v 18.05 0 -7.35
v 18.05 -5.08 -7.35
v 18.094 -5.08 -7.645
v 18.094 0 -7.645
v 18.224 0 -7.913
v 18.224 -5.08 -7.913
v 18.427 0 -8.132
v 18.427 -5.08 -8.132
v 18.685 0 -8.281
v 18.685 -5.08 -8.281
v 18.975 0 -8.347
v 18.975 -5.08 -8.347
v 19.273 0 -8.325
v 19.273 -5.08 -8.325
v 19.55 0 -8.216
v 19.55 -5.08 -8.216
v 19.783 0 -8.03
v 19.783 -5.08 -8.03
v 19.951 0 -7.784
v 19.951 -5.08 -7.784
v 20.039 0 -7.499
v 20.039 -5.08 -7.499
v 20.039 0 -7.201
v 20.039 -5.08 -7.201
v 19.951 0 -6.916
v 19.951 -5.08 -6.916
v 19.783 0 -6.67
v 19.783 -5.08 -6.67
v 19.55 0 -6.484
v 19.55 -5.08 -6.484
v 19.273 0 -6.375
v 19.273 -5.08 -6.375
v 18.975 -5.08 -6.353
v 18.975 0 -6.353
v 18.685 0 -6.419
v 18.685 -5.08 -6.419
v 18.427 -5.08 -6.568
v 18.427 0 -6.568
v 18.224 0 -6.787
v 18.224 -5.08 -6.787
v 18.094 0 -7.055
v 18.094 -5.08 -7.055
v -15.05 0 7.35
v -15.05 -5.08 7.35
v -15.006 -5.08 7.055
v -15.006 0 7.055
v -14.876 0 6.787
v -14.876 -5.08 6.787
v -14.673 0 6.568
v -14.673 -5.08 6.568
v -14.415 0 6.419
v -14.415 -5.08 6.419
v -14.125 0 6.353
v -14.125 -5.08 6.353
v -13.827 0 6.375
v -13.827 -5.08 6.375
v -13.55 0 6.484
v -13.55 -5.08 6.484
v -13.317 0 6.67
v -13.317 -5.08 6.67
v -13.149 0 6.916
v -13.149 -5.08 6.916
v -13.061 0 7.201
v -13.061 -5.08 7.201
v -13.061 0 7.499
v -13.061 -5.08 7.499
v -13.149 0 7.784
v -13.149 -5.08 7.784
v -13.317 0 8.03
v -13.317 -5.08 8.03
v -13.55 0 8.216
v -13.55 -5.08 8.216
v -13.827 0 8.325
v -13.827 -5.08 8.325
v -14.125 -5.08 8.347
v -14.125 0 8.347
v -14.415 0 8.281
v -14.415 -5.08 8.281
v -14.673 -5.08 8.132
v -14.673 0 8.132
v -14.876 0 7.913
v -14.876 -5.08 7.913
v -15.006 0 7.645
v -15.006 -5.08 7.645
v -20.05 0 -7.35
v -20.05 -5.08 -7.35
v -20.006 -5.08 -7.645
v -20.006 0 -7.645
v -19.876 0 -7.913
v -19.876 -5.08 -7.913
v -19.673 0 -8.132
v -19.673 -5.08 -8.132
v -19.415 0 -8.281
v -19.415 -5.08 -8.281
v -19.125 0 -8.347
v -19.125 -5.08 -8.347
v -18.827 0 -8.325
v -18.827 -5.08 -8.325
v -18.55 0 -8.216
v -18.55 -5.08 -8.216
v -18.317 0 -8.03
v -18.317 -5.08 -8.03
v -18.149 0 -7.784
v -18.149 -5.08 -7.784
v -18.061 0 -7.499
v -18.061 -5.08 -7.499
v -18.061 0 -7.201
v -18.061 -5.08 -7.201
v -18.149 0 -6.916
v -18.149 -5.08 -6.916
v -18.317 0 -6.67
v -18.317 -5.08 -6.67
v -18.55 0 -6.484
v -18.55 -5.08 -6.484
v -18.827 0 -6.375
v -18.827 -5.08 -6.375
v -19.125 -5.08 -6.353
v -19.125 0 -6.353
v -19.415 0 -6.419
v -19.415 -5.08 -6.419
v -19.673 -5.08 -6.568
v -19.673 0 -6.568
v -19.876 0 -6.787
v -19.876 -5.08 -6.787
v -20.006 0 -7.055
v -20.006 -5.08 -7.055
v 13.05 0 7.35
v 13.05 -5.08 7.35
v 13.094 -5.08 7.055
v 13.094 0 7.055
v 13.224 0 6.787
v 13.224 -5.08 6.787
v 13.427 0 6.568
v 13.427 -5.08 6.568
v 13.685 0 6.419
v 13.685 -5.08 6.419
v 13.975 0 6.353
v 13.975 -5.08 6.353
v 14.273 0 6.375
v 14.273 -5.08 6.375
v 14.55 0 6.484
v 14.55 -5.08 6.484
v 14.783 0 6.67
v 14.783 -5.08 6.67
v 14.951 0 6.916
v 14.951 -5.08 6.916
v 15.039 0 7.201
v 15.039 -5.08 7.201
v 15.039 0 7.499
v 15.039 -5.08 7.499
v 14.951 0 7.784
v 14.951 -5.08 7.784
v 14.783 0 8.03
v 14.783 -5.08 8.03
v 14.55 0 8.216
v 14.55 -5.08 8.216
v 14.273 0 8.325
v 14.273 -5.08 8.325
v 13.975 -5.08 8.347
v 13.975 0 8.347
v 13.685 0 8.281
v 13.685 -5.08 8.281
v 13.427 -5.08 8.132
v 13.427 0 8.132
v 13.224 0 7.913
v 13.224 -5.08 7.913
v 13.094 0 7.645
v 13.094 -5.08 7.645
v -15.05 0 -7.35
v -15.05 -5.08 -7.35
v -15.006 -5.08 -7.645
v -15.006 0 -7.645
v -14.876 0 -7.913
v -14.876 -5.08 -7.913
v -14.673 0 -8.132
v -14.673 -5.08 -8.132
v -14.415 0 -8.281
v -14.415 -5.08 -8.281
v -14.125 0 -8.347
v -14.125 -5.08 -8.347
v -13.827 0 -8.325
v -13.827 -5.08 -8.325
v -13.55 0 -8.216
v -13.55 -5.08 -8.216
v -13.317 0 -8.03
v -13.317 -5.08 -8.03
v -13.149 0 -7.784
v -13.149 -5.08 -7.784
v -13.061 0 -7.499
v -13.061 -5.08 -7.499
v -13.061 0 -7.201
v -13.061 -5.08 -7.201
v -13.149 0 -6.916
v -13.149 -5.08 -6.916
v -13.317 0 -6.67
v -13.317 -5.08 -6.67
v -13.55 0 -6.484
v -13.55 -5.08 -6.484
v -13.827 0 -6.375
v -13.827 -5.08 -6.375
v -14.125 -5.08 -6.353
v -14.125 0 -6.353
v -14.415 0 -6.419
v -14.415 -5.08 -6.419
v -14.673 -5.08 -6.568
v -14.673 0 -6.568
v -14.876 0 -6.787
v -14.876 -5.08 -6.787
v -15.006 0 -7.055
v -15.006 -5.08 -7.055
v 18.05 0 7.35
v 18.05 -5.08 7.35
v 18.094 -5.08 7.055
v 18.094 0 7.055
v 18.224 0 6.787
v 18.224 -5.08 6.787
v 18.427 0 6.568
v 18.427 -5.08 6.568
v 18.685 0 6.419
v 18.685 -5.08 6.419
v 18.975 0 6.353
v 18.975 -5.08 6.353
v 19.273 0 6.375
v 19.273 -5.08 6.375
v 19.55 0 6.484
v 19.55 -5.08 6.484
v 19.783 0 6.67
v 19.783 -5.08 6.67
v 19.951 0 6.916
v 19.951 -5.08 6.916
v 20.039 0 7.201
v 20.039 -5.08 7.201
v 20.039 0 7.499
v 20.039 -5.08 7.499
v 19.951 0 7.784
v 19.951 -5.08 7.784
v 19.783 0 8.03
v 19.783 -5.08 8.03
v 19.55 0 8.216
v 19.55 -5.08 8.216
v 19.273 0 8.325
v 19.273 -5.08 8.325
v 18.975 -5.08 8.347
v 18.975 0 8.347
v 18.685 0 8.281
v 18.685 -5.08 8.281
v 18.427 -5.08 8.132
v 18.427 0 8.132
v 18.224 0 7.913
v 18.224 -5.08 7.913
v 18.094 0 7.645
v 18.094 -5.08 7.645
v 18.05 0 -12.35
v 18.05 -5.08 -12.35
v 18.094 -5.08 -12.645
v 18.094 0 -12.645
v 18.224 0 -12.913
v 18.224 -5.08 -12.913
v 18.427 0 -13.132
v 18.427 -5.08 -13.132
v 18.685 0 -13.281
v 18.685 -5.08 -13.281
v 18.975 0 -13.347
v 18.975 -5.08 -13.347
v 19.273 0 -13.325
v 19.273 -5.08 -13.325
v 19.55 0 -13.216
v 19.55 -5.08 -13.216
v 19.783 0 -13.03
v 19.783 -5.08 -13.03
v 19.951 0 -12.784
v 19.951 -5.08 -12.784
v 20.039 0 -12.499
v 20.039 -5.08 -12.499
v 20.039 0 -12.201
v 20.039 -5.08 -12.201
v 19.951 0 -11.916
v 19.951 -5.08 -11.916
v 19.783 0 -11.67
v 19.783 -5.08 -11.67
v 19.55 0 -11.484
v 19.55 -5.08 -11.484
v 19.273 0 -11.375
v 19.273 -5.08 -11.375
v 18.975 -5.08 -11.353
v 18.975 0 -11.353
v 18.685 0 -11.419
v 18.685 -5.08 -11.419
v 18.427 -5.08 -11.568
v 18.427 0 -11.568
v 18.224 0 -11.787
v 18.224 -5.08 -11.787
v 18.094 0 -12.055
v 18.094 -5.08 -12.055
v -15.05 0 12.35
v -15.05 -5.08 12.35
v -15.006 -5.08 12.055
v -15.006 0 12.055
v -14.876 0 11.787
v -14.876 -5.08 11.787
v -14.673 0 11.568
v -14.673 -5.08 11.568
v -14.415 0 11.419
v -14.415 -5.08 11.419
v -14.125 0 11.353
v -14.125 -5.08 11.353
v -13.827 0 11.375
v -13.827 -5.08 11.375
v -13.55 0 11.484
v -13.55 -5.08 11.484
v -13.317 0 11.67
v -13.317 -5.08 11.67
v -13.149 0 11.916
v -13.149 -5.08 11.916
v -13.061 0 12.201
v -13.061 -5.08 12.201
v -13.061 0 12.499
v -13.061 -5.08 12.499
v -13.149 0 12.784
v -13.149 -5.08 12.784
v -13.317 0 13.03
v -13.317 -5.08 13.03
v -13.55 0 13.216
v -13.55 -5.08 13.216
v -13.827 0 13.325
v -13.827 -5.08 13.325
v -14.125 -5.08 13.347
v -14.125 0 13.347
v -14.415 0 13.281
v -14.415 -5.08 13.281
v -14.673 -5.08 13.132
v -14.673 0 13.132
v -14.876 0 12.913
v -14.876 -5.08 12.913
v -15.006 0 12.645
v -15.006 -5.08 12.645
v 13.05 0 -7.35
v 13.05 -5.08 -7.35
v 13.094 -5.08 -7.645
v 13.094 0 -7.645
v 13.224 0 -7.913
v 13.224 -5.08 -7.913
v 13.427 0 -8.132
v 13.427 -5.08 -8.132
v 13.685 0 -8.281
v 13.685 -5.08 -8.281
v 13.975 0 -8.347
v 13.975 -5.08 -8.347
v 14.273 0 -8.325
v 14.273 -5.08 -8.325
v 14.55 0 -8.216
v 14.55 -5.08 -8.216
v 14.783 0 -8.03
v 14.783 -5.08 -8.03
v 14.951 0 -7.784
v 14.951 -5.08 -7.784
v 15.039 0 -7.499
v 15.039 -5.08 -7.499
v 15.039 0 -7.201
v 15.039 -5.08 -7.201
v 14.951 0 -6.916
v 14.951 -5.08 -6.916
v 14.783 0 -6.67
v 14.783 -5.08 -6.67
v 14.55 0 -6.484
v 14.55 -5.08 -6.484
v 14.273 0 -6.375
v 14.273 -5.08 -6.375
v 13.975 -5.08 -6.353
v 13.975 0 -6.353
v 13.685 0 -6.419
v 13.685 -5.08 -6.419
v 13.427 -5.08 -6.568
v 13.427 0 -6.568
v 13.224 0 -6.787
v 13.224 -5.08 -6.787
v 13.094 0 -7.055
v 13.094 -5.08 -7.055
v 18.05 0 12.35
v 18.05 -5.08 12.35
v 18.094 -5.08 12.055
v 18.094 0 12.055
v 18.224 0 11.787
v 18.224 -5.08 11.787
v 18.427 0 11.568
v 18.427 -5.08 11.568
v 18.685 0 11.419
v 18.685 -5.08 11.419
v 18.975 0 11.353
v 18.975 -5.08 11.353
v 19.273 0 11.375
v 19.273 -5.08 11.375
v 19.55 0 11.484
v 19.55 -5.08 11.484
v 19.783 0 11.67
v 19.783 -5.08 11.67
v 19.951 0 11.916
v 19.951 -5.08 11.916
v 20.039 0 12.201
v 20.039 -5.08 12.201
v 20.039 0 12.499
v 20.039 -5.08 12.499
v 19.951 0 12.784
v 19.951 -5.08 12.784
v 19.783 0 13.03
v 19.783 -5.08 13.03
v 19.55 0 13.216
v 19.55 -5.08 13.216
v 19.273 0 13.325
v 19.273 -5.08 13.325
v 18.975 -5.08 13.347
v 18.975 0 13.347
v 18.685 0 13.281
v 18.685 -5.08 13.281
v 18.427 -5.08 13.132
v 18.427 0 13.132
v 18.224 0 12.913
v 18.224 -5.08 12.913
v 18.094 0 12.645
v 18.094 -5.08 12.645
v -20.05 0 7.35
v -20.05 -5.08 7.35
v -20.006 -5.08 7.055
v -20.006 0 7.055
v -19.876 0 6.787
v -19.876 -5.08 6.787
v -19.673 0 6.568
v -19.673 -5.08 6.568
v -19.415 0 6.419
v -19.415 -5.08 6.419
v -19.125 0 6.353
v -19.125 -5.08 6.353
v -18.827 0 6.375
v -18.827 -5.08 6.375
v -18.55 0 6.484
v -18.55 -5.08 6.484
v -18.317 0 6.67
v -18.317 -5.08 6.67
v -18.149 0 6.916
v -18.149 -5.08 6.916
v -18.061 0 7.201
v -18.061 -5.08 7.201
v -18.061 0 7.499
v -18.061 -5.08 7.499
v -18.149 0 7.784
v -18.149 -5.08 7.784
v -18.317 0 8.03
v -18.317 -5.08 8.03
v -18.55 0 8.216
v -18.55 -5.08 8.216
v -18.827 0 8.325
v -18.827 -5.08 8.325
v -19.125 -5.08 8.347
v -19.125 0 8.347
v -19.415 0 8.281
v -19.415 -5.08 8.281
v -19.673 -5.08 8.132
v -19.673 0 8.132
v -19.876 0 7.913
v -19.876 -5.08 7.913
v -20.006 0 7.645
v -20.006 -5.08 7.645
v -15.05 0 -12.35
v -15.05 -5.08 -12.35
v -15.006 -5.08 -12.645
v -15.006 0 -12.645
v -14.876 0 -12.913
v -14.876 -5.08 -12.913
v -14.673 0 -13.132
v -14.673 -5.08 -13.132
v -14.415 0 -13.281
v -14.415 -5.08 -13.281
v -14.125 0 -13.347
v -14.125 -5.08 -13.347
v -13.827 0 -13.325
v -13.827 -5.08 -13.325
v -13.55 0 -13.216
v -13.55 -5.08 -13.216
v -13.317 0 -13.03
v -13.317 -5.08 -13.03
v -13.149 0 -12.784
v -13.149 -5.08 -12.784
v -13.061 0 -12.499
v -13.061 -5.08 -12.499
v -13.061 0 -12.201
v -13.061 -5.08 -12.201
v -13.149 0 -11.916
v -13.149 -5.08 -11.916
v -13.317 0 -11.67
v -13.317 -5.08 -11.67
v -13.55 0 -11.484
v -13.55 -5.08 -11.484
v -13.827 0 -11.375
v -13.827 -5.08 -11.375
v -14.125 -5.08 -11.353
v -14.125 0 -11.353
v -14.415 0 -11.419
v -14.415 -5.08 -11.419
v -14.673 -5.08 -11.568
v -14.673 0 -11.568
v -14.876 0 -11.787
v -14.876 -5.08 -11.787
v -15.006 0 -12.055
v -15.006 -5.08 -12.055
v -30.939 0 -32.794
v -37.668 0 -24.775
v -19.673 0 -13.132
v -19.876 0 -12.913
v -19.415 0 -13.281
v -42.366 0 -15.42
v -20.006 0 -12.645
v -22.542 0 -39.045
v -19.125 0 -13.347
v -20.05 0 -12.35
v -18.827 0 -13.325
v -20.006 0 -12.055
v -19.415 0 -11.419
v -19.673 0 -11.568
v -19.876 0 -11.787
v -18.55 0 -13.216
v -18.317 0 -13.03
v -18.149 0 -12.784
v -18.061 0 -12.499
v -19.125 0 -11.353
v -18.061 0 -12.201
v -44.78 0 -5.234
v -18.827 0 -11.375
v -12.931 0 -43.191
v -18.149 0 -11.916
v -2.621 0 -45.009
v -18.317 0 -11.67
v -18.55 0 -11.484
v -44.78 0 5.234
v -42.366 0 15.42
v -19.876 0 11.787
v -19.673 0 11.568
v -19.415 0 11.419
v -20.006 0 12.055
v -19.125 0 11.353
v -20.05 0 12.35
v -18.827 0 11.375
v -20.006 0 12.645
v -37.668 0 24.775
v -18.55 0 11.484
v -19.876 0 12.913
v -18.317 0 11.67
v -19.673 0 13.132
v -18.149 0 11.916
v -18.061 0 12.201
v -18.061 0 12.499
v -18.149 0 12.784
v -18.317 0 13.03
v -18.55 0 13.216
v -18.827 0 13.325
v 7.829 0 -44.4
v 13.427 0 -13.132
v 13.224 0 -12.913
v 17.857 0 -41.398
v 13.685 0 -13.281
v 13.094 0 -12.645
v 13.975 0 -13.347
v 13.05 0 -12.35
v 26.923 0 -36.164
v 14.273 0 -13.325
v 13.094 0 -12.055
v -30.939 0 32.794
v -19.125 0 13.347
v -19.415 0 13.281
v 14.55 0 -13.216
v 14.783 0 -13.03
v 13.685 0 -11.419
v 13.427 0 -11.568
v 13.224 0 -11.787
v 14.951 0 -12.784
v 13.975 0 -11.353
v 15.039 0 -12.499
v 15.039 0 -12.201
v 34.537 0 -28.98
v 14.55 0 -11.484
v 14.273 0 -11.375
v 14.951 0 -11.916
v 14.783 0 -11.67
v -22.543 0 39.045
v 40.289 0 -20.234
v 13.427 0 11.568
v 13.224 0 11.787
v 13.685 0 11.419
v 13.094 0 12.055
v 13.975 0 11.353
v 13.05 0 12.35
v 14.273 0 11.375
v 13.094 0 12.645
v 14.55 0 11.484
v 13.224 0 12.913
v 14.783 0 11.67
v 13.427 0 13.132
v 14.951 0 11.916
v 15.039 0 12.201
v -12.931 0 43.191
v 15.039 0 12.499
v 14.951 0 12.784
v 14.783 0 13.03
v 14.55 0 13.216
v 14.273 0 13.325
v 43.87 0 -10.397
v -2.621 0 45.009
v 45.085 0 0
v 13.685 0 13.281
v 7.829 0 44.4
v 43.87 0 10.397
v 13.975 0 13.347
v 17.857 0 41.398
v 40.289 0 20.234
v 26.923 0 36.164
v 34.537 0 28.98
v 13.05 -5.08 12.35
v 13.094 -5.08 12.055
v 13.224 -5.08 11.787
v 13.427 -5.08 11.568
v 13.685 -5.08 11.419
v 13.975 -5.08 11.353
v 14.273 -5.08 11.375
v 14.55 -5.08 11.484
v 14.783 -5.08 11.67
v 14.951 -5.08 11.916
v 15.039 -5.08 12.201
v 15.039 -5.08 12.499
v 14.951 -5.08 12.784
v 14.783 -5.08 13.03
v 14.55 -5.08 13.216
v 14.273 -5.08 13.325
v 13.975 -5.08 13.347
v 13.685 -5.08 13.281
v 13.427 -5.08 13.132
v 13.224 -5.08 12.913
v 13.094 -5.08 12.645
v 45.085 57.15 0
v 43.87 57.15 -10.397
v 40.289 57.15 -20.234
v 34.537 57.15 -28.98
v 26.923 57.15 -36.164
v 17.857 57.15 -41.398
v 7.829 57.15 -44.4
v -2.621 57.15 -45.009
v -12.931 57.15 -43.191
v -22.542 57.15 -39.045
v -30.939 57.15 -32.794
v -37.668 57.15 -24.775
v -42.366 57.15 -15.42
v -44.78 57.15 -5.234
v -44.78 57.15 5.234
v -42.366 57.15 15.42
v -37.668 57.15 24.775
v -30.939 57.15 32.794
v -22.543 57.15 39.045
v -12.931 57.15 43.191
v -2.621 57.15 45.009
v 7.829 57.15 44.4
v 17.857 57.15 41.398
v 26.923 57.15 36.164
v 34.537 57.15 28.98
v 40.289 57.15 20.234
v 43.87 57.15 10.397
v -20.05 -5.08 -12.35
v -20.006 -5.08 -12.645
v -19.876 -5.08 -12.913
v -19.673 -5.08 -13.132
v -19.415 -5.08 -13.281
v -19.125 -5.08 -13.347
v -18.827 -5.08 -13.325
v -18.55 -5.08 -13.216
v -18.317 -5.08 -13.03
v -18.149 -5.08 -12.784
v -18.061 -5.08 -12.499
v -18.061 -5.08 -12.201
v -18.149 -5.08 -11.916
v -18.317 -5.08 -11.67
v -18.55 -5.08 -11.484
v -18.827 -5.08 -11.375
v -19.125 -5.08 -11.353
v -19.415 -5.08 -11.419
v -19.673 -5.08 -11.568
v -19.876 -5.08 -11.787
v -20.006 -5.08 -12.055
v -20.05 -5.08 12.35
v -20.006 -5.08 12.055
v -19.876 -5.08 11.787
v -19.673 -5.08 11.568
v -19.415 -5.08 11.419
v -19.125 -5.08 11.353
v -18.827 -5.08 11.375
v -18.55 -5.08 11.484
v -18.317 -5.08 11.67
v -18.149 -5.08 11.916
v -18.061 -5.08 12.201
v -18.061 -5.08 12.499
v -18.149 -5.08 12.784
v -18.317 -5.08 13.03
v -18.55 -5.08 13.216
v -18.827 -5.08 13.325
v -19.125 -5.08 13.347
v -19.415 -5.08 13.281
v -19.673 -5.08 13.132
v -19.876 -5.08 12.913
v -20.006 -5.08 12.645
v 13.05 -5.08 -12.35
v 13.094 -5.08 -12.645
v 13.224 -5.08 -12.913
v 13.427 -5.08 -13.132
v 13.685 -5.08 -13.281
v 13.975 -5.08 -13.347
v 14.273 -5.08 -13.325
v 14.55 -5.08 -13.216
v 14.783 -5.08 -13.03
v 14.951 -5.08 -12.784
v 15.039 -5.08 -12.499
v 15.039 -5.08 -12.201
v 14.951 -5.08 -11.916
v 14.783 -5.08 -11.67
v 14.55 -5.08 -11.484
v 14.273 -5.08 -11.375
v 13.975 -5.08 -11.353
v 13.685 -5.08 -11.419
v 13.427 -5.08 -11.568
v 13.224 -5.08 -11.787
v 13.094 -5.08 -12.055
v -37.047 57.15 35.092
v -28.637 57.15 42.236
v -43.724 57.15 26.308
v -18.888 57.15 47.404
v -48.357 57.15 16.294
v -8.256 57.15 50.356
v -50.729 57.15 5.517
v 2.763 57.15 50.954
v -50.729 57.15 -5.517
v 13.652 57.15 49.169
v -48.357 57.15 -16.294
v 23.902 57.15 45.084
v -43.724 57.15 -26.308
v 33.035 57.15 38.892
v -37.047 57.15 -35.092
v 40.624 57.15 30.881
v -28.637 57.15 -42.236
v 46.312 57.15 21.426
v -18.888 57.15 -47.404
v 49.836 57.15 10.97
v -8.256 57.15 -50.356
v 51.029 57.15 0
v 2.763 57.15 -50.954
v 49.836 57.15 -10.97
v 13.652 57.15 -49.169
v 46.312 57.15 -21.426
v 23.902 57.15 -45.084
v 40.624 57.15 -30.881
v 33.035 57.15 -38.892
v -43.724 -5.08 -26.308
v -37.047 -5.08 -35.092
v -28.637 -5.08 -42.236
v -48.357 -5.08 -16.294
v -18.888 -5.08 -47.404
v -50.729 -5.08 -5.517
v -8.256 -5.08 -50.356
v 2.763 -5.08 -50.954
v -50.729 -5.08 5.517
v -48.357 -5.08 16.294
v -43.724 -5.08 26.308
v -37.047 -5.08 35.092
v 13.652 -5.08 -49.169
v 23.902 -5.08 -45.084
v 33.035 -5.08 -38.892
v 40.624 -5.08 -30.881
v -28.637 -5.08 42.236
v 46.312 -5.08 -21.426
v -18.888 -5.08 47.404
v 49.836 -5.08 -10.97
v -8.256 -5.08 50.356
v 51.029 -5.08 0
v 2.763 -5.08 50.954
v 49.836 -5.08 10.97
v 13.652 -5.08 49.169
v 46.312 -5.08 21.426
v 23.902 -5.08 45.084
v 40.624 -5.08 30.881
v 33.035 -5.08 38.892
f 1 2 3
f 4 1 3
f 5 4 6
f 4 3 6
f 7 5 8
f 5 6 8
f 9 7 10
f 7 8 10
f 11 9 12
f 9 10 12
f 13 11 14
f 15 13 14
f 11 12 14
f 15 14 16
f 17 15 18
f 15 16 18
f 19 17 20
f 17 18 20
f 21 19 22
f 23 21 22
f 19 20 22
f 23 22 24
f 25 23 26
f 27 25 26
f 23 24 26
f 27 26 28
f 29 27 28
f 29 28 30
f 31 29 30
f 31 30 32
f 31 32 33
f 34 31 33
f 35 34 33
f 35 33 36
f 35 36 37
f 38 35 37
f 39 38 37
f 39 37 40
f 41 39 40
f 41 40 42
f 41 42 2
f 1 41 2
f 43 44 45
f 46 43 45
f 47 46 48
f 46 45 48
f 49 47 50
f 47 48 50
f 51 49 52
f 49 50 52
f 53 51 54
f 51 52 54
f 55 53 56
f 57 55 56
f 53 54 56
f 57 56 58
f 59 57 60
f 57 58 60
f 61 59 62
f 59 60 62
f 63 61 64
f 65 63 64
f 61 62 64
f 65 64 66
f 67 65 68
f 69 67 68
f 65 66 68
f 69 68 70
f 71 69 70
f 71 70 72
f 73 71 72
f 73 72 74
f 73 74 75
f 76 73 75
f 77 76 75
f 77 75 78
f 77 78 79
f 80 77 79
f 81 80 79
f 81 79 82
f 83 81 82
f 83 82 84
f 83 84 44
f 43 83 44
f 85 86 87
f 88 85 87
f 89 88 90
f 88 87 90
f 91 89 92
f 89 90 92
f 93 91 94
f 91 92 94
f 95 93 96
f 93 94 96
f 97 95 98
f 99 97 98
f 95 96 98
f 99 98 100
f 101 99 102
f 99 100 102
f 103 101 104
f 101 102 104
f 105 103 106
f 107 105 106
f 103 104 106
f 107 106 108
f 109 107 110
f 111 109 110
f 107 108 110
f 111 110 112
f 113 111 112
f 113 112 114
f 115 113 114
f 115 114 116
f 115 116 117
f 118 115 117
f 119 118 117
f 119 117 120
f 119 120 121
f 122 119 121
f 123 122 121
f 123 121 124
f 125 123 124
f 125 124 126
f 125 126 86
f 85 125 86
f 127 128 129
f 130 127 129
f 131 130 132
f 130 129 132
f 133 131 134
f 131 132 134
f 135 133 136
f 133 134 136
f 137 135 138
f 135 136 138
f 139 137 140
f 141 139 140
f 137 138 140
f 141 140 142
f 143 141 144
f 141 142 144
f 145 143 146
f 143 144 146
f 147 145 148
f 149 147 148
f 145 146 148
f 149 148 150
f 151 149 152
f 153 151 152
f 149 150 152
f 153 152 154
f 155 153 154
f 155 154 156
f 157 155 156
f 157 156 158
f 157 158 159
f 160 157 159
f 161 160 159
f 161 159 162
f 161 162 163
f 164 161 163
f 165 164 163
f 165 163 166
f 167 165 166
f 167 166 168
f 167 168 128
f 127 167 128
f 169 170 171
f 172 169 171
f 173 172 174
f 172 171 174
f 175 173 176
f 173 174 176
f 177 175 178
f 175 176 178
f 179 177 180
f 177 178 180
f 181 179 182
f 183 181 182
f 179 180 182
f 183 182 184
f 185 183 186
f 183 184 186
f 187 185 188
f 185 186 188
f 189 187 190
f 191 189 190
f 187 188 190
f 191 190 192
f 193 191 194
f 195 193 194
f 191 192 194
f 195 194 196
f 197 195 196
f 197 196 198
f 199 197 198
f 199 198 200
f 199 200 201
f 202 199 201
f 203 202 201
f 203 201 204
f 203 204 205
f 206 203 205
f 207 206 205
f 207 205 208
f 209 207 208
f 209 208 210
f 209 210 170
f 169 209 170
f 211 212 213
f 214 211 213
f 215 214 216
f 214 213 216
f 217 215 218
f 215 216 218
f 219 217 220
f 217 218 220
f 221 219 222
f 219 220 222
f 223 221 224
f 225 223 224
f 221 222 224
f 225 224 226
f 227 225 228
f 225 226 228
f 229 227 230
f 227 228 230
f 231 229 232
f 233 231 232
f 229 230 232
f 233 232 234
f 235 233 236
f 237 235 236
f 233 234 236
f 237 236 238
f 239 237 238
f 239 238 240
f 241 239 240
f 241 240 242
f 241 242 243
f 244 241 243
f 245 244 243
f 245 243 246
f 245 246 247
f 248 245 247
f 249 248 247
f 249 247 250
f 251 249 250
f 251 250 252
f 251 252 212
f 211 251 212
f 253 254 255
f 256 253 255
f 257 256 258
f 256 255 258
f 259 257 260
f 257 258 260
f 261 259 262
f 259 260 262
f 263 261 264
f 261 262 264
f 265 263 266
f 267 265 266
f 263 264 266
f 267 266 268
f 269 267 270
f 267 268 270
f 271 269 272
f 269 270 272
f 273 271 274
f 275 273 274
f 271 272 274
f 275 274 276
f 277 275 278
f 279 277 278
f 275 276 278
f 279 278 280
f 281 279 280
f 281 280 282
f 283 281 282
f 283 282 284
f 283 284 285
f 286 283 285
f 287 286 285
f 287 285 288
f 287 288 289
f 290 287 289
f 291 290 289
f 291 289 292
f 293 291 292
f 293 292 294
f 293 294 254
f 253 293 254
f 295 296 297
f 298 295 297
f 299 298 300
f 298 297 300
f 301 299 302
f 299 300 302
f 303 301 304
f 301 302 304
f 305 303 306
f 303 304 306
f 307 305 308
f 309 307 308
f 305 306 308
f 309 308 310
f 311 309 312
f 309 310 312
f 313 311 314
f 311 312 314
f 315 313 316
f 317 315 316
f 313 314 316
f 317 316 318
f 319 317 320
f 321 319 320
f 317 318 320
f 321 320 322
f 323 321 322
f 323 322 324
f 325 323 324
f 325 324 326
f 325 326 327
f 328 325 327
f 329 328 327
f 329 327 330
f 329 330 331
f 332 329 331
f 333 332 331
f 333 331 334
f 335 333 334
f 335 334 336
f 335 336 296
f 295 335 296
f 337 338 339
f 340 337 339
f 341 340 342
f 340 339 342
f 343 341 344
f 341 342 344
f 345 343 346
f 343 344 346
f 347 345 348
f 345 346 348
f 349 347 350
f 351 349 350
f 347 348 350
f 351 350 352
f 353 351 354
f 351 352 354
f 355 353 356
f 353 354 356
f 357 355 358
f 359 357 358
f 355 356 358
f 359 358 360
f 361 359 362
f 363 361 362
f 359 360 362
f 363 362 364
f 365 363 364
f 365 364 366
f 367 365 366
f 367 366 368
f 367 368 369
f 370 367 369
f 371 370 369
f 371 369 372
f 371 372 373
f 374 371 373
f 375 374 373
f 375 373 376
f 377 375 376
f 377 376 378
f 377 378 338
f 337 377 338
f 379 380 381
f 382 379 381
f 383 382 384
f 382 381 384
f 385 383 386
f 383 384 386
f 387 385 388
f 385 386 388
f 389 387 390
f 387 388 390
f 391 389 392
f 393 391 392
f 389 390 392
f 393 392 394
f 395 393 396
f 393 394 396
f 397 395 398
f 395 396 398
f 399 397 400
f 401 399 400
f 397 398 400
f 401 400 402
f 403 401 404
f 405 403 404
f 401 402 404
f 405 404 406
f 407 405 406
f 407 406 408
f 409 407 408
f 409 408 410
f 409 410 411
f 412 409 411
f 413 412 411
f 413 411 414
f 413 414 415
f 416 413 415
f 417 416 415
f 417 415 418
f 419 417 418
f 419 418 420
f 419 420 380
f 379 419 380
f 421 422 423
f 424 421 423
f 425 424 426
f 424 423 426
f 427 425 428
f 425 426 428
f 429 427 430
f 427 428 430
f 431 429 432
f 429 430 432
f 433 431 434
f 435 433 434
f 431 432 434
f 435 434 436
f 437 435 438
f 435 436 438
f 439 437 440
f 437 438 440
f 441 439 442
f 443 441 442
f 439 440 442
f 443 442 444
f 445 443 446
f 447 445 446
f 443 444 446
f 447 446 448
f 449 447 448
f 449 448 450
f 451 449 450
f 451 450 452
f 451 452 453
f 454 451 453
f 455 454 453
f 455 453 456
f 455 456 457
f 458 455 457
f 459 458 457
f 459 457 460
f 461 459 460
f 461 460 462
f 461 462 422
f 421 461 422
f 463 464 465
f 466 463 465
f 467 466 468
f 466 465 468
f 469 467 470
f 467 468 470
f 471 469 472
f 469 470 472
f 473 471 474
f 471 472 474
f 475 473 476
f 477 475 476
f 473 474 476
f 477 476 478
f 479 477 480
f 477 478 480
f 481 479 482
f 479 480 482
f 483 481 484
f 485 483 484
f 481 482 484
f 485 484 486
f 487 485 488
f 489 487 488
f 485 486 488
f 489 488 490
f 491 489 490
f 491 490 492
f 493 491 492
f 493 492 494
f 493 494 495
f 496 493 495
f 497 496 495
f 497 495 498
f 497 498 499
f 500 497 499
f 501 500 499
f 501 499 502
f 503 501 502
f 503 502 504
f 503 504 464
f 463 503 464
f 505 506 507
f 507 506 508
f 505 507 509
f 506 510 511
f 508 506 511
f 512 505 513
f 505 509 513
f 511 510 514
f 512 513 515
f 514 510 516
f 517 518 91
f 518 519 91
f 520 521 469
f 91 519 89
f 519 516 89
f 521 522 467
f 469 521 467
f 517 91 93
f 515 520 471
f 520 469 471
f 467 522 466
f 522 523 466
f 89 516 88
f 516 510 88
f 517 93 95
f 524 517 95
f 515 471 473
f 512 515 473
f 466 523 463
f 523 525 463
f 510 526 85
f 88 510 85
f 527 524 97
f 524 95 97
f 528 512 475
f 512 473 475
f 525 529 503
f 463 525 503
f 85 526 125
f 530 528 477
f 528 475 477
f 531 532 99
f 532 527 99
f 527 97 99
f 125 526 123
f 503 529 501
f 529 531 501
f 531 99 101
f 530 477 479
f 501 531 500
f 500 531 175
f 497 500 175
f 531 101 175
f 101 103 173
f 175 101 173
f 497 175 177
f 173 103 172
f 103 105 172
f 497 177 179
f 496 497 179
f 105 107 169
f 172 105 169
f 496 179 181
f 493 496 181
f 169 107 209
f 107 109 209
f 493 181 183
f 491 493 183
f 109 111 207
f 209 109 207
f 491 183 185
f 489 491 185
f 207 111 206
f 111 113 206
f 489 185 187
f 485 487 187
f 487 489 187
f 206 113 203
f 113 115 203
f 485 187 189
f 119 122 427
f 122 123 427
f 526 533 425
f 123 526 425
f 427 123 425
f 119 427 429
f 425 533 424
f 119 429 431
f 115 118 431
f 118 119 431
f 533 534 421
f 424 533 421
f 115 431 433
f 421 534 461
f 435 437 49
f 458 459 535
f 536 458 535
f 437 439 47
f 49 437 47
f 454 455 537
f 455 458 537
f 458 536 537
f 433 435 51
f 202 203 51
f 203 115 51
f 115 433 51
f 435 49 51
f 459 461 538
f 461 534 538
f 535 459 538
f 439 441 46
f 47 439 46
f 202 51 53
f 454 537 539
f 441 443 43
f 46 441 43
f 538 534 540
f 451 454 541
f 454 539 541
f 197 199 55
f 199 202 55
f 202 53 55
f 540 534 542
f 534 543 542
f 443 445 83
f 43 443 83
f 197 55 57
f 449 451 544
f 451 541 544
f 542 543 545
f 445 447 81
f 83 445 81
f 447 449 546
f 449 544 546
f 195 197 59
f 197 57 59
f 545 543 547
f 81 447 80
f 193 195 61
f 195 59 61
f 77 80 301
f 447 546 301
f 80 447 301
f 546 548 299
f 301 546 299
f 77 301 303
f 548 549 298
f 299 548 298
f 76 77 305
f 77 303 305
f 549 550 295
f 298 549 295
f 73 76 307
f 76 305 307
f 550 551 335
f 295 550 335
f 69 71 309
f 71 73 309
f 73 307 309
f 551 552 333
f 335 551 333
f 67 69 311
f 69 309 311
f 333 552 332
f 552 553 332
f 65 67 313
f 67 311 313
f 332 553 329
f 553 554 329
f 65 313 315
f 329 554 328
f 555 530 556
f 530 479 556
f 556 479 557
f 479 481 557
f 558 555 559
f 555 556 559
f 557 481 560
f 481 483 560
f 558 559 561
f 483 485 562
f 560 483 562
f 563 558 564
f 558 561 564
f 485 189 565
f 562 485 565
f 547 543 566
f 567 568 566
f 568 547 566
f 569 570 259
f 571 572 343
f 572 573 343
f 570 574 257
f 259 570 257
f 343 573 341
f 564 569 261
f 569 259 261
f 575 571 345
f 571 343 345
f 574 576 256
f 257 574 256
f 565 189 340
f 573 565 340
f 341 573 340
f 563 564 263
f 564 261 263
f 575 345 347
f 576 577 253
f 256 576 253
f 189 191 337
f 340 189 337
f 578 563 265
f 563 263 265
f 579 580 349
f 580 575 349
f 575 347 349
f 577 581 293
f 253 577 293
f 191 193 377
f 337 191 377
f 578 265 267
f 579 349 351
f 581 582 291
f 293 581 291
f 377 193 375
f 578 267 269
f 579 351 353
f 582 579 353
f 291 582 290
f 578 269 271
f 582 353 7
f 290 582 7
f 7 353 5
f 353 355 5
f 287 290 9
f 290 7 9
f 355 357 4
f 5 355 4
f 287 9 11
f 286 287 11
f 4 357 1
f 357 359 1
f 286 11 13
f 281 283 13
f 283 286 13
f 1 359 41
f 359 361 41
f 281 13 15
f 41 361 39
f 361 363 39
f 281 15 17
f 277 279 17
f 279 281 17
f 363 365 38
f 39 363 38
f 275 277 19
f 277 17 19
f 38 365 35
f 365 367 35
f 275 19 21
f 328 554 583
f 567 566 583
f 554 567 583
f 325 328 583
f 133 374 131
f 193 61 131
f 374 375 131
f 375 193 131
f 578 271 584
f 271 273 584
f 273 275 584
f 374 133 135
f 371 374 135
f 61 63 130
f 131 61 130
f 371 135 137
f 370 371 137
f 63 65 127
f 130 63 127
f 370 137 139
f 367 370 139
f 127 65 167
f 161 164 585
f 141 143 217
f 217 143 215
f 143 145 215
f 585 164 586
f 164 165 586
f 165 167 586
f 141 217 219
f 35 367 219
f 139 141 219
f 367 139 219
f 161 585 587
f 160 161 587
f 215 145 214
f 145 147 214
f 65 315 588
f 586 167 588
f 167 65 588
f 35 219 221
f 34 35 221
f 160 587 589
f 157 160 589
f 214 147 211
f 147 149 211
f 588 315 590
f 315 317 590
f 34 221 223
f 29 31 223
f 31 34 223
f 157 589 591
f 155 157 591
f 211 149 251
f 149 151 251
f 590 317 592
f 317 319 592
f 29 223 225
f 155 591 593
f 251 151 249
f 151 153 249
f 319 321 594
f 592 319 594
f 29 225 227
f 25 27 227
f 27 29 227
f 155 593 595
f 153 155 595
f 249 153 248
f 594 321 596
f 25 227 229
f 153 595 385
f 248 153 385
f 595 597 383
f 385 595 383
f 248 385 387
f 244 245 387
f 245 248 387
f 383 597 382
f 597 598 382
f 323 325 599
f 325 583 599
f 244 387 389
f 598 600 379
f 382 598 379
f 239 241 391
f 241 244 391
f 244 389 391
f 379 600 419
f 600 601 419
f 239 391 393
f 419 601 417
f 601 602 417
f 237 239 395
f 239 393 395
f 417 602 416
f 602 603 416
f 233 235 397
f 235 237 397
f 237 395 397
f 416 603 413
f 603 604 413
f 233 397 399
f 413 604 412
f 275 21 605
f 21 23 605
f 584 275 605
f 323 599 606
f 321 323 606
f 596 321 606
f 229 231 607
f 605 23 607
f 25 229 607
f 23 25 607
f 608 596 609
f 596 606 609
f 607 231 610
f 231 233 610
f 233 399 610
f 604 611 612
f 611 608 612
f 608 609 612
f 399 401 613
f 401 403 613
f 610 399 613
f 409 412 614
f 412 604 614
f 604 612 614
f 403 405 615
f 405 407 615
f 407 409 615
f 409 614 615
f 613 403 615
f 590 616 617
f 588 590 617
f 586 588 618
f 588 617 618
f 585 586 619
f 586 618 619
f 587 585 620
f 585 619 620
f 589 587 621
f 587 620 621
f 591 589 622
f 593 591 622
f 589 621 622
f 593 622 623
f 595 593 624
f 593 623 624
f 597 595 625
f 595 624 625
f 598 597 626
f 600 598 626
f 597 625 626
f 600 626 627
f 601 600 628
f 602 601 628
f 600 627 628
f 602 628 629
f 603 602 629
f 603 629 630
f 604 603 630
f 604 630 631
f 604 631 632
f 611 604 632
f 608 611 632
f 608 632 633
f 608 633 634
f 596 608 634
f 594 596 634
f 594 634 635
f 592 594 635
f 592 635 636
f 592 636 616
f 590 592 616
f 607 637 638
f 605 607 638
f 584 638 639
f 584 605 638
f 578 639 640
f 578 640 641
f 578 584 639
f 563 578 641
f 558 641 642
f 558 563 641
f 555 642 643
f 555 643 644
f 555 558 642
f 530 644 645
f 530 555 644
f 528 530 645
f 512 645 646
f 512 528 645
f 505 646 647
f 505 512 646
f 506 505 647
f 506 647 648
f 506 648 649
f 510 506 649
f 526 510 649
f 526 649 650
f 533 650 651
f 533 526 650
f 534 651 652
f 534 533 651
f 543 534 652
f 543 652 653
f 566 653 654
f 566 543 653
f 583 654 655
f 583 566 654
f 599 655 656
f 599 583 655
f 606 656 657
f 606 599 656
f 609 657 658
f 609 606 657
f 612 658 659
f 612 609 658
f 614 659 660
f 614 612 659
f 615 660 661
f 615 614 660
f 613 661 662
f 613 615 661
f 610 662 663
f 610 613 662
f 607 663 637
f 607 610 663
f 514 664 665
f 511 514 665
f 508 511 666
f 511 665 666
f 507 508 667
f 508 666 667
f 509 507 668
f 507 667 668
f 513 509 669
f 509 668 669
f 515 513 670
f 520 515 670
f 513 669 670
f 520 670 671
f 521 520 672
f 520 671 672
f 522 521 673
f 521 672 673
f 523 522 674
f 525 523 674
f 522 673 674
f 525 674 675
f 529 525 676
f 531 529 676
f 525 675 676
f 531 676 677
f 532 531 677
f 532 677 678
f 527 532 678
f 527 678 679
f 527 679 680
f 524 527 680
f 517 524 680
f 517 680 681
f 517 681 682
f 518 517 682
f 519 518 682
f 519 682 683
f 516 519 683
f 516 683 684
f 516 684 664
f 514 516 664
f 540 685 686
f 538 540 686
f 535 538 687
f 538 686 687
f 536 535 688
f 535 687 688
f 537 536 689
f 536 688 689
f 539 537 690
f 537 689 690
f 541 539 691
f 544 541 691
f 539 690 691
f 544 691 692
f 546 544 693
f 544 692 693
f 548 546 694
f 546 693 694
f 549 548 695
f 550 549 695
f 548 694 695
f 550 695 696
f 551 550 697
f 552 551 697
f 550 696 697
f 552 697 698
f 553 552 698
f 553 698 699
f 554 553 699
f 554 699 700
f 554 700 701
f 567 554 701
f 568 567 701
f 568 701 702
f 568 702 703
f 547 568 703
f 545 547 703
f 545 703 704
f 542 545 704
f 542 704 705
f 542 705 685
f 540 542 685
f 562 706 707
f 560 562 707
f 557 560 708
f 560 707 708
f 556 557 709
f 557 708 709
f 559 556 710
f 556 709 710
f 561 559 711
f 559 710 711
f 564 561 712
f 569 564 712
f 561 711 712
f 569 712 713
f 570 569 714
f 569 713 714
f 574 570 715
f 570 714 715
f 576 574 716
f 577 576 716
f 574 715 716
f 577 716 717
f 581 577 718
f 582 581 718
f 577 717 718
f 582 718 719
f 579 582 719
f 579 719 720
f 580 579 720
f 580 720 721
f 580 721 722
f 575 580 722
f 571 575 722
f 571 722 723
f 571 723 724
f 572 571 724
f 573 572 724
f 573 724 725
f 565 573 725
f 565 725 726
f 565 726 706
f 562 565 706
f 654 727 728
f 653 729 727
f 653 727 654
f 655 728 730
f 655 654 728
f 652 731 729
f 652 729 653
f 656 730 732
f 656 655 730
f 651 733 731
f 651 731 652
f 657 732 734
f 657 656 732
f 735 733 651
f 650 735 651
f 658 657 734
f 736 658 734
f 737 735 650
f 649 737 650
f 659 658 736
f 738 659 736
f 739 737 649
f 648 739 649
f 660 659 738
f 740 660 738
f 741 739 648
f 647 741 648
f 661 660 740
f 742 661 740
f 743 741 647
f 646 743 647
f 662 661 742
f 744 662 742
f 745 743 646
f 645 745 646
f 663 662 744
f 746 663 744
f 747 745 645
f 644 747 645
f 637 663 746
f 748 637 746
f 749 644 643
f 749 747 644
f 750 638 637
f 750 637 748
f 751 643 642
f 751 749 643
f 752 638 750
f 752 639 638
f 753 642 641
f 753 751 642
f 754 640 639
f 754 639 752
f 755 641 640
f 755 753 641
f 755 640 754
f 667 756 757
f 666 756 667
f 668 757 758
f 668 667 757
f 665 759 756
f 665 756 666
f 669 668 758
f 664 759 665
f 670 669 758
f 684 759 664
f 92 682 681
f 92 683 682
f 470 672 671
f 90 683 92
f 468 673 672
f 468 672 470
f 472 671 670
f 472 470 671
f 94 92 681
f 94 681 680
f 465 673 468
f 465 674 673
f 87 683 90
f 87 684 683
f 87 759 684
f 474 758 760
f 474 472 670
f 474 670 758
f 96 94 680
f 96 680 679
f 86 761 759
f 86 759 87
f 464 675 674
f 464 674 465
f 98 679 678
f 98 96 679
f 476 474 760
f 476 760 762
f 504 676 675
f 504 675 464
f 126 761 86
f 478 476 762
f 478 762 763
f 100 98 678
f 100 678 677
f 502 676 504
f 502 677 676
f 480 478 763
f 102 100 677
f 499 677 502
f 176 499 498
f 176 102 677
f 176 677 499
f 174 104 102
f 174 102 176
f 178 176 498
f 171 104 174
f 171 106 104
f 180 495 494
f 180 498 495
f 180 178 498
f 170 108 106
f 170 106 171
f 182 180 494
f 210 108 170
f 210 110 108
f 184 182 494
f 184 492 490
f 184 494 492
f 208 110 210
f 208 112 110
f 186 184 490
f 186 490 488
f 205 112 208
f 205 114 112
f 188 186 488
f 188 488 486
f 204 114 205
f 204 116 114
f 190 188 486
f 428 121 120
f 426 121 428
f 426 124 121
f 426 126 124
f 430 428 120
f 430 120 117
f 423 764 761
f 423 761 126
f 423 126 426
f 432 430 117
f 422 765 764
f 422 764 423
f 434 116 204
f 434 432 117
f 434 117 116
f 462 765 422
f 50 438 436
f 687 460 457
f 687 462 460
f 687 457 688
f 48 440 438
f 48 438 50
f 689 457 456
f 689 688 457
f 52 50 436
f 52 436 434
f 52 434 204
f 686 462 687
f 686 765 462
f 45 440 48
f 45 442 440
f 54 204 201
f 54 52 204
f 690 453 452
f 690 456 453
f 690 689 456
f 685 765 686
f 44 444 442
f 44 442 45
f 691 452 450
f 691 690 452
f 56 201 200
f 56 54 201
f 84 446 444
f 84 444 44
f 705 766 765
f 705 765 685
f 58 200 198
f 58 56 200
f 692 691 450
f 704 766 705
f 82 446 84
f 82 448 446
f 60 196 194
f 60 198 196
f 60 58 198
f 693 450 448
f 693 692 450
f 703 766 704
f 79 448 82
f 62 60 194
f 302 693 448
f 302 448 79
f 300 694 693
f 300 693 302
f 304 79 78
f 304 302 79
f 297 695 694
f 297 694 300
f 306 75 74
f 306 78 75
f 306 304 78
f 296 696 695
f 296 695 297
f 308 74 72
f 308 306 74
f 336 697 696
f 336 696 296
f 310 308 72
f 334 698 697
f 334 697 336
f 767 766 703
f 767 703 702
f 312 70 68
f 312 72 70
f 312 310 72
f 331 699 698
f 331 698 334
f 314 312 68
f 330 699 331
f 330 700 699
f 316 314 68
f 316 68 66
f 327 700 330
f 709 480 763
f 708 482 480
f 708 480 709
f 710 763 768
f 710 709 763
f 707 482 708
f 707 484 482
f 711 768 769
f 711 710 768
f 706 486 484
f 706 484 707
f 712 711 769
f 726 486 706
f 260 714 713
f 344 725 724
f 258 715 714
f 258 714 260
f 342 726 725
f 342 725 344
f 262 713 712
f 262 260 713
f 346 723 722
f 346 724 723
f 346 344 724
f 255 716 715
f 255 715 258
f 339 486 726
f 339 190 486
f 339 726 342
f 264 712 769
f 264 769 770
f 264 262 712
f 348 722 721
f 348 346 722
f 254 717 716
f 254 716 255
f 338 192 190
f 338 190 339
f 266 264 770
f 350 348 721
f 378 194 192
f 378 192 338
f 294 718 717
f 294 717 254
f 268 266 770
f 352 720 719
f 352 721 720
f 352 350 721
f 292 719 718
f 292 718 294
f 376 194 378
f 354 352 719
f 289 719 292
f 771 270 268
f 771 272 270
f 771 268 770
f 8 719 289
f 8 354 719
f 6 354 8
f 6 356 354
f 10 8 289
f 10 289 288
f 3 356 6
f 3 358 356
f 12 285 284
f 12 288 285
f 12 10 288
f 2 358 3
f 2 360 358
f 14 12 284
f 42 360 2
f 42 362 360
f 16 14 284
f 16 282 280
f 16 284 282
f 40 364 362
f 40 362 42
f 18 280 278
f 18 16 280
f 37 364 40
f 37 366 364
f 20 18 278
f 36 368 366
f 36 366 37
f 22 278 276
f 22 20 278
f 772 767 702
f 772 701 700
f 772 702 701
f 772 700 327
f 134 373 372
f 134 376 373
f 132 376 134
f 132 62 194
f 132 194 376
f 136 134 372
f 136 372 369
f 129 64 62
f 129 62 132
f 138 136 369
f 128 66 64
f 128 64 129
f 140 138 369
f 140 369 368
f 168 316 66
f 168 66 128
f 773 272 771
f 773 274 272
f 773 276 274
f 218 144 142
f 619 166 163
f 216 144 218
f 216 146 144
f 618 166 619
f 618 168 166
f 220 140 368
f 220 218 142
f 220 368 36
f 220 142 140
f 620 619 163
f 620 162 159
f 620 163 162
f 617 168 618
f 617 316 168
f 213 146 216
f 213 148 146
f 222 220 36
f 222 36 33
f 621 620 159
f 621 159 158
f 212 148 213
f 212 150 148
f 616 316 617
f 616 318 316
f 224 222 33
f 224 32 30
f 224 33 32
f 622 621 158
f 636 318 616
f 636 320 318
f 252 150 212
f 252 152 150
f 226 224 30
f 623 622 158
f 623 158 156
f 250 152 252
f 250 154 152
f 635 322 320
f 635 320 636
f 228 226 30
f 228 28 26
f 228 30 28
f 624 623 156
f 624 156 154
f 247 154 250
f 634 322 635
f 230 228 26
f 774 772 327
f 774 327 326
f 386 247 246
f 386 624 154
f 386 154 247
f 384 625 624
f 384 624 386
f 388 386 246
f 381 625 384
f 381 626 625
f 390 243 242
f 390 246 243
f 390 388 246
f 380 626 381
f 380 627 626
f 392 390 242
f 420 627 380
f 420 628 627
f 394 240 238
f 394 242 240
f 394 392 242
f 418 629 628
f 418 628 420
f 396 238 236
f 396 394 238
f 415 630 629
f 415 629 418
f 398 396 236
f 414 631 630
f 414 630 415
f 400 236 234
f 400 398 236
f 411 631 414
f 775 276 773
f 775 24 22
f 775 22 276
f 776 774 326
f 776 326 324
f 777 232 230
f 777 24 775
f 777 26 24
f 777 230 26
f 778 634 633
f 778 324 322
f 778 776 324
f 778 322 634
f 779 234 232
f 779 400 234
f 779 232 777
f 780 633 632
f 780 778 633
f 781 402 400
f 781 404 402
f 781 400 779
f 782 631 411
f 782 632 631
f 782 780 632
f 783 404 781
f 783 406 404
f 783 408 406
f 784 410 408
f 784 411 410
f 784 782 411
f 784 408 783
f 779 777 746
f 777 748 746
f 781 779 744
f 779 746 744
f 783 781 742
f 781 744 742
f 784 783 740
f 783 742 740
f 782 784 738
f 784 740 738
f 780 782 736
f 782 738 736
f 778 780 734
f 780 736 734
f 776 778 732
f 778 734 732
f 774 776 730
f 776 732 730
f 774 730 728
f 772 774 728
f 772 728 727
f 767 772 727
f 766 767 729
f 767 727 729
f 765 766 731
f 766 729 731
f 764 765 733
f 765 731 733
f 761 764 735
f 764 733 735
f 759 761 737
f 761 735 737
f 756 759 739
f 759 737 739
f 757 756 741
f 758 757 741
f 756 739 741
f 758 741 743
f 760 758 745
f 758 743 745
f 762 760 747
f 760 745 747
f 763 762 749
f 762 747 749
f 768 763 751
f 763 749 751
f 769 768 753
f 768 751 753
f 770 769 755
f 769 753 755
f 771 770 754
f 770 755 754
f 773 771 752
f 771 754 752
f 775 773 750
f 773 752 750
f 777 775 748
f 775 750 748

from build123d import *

# Parameters (mm, degrees)
SKETCH1_R               = 51.0286
SKETCH1_R_2             = 45.085
BOSS_EXTRUDE1_DEPTH     = 57.15
SKETCH2_R               = 51.0286
BOSS_EXTRUDE2_DEPTH     = 5.08
SKETCH3_R               = 1
CUT_EXTRUDE1_DEPTH      = 1
CUT_EXTRUDE1_DEPTH_BACK = 63.23


with BuildPart() as part:
    # Sketch1 → Boss-Extrude1 (new body)
    with BuildSketch(Plane(origin=(0, 0, 0), x_dir=(1, 0, 0), z_dir=(0, 1, 0))):
        Circle(SKETCH1_R)
        Circle(SKETCH1_R_2, mode=Mode.SUBTRACT)
    extrude(amount=BOSS_EXTRUDE1_DEPTH)

    # Sketch2 → Boss-Extrude2 (add)
    with BuildSketch(Plane.XZ):
        Circle(SKETCH2_R)
    extrude(amount=BOSS_EXTRUDE2_DEPTH)

    # Sketch3 → Cut-Extrude1 (cut, two sides)
    with BuildSketch(Plane(origin=(0, -5.08, 0), x_dir=(-1, 0, 0), z_dir=(0, -1, 0))) as cut_extrude1_sk:
        with Locations((14.049999967, -7.349999968)):
            Circle(SKETCH3_R)
        with Locations((14.049999967, -12.349999968)):
            Circle(SKETCH3_R)
        with Locations((19.049999967, -12.349999968)):
            Circle(SKETCH3_R)
        with Locations((19.049999967, -7.349999968)):
            Circle(SKETCH3_R)
        with Locations((19.049999967, 7.350000032)):
            Circle(SKETCH3_R)
        with Locations((19.049999967, 12.350000032)):
            Circle(SKETCH3_R)
        with Locations((14.049999967, 12.350000032)):
            Circle(SKETCH3_R)
        with Locations((-14.050000033, 12.350000032)):
            Circle(SKETCH3_R)
        with Locations((-14.050000033, 7.350000032)):
            Circle(SKETCH3_R)
        with Locations((-19.050000033, 12.350000032)):
            Circle(SKETCH3_R)
        with Locations((-19.050000033, 7.350000032)):
            Circle(SKETCH3_R)
        with Locations((-19.050000033, -7.349999968)):
            Circle(SKETCH3_R)
        with Locations((-14.050000033, -7.349999968)):
            Circle(SKETCH3_R)
        with Locations((-14.050000033, -12.349999968)):
            Circle(SKETCH3_R)
        with Locations((-19.050000033, -12.349999968)):
            Circle(SKETCH3_R)
        with Locations((14.049999967, 7.350000032)):
            Circle(SKETCH3_R)
    extrude(amount=CUT_EXTRUDE1_DEPTH, mode=Mode.SUBTRACT)
    extrude(cut_extrude1_sk.sketch, amount=-CUT_EXTRUDE1_DEPTH_BACK, mode=Mode.SUBTRACT)


solid = part.part
